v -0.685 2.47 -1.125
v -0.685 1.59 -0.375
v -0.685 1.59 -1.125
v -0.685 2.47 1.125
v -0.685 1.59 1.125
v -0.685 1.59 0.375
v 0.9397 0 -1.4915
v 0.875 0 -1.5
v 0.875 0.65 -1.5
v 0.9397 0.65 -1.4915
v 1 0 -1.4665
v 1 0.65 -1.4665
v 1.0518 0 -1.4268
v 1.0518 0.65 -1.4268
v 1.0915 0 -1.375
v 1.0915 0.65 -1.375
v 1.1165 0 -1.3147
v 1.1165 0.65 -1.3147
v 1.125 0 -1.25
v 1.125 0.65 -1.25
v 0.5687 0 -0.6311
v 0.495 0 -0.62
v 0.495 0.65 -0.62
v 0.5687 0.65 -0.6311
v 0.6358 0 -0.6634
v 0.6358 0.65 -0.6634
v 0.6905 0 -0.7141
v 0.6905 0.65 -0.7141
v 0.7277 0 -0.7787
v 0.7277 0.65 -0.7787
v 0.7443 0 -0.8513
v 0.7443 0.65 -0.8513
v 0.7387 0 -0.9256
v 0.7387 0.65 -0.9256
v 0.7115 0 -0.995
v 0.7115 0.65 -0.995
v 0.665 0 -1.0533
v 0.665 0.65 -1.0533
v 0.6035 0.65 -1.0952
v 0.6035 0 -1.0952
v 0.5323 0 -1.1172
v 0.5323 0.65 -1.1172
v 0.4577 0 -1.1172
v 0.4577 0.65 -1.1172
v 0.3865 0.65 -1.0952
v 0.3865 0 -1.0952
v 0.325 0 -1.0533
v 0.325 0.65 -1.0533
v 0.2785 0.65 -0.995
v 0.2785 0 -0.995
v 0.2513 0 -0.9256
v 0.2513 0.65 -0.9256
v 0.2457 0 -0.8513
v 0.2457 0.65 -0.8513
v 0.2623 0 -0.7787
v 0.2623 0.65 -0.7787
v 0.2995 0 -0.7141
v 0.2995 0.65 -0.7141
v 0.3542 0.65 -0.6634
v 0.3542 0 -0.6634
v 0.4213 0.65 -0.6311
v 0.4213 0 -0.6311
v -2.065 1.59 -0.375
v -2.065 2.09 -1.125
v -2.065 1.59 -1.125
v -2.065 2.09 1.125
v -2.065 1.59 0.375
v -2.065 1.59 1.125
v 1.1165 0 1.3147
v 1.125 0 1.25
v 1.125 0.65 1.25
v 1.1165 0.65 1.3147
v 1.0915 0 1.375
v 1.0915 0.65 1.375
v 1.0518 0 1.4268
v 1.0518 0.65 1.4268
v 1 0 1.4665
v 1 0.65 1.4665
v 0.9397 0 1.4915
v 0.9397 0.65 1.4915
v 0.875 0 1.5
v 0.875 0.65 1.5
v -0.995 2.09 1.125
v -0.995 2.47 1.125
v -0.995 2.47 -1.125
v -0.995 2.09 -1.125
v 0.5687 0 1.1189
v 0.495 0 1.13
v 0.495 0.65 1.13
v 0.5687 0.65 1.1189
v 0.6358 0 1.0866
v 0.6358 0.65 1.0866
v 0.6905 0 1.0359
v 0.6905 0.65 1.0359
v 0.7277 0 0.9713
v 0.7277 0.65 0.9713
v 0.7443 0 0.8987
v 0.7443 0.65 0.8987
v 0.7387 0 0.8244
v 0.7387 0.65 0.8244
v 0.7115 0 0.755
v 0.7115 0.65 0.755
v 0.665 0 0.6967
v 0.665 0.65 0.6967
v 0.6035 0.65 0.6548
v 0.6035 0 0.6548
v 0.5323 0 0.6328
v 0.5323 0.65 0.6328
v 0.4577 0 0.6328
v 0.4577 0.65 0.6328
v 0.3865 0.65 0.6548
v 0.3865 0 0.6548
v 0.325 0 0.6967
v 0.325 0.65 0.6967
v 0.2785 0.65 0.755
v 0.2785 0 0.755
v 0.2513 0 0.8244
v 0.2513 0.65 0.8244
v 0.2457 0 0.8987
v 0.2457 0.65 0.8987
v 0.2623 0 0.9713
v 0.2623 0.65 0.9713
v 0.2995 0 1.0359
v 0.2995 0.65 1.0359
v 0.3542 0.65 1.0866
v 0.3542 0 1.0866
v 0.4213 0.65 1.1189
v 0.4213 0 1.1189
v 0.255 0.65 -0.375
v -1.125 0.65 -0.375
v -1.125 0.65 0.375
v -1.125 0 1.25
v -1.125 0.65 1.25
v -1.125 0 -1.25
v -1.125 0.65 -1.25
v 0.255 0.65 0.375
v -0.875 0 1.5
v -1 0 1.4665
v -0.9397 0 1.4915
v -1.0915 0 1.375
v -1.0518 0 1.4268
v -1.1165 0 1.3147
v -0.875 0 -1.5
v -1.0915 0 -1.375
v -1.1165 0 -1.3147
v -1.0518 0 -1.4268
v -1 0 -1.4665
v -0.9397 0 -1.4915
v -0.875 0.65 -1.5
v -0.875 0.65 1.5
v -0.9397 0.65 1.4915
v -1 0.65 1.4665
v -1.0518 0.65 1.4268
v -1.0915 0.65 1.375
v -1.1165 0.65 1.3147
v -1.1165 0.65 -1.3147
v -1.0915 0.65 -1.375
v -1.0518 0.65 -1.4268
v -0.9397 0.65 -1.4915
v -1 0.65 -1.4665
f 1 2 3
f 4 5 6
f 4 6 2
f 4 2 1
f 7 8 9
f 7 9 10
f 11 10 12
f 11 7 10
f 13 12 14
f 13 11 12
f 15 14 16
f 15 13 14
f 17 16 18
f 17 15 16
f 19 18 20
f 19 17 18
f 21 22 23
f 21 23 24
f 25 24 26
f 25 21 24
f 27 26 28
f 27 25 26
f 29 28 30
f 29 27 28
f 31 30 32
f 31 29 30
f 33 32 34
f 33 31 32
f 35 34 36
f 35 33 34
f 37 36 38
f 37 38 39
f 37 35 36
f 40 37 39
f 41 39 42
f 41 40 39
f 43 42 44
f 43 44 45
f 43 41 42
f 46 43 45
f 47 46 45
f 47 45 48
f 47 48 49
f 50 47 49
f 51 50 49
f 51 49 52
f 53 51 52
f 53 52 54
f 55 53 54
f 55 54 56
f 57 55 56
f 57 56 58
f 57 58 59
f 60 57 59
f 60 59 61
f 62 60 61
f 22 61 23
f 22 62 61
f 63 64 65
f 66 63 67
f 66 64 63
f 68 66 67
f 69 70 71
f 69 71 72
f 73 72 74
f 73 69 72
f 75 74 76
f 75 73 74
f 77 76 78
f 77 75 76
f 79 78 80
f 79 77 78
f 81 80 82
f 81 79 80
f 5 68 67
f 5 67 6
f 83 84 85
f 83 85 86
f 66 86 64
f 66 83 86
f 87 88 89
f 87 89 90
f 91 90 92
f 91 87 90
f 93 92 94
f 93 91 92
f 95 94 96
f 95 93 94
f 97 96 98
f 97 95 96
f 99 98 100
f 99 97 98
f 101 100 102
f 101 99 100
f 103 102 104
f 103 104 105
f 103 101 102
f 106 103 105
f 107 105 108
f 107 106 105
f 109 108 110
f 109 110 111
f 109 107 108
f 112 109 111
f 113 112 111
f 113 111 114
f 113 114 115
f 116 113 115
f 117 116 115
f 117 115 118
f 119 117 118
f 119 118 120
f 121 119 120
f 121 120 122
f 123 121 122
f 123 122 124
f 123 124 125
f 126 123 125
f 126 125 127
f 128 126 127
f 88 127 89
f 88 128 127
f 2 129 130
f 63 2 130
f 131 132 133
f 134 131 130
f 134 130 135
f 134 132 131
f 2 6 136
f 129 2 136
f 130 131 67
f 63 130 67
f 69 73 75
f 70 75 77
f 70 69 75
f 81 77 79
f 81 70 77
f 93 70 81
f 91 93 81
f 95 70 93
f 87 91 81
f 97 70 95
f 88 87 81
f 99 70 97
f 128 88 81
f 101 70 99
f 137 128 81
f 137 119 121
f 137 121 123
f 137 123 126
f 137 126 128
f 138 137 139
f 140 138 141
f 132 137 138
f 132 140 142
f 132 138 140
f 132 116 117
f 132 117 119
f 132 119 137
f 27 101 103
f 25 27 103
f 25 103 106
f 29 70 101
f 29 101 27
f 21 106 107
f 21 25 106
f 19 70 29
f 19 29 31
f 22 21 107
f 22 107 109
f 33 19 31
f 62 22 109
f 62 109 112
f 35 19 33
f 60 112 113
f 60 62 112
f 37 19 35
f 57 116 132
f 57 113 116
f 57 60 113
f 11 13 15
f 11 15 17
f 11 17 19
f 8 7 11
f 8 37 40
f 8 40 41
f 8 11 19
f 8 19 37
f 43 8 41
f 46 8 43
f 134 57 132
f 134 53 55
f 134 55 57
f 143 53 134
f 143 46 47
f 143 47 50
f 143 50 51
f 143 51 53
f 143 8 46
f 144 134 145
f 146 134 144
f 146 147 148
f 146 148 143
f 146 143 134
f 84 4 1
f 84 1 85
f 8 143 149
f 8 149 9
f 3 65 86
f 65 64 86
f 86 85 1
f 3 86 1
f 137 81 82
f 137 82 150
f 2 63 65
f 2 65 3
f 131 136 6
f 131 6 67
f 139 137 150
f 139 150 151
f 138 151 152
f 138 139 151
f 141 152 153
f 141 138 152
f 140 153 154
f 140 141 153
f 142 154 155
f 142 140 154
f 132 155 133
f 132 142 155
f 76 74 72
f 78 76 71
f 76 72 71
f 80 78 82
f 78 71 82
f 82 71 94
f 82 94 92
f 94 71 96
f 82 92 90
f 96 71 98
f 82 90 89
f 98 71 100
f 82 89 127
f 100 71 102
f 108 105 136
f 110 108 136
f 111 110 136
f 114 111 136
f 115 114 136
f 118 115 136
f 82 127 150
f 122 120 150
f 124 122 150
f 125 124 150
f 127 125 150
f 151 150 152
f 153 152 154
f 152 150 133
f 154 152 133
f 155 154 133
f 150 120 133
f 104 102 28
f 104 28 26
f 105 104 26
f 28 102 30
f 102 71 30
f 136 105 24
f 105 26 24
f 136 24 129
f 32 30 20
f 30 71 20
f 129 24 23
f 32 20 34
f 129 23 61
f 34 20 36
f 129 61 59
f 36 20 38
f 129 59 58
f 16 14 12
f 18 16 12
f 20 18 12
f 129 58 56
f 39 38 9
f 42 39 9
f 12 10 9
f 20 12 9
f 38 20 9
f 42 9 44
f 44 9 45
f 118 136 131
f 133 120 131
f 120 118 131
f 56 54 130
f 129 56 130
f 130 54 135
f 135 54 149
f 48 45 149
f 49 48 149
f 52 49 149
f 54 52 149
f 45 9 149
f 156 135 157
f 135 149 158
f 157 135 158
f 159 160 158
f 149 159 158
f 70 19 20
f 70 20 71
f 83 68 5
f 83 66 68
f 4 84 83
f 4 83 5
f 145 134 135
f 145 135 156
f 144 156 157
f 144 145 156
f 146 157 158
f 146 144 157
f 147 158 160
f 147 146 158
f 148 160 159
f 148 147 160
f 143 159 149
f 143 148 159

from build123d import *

# Parameters (mm, degrees)
CROQUIS1_R              = 0.25
SALIENTE_EXTRUIR2_DEPTH = 0.65
SALIENTE_EXTRUIR3_DEPTH = 0.375
SALIENTE_EXTRUIR4_DEPTH = 1.125


with BuildPart() as part:
    # Croquis1 → Saliente-Extruir2 (new body)
    with BuildSketch(Plane(origin=(0, 0, 0), x_dir=(1, 0, 0), z_dir=(0, 1, 0))):
        with BuildLine():
            Line((-0.875, 1.5), (0.875, 1.5))
            ThreePointArc((0.875, 1.5), (1.051776695, 1.426776695), (1.125, 1.25))
            Line((1.125, 1.25), (1.125, -1.25))
            ThreePointArc((1.125, -1.25), (1.051776695, -1.426776695), (0.875, -1.5))
            Line((0.875, -1.5), (-0.875, -1.5))
            ThreePointArc((-0.875, -1.5), (-1.051776695, -1.426776695), (-1.125, -1.25))
            Line((-1.125, -1.25), (-1.125, 1.25))
            ThreePointArc((-1.125, 1.25), (-1.051776695, 1.426776695), (-0.875, 1.5))
        make_face()
        with Locations(Location((0.495, 0.87, 0), (0, 0, 270))):
            Circle(CROQUIS1_R, mode=Mode.SUBTRACT)
        with Locations(Location((0.495, -0.88, 0), (0, 0, 270))):
            Circle(CROQUIS1_R, mode=Mode.SUBTRACT)
    extrude(amount=SALIENTE_EXTRUIR2_DEPTH)

    # Croquis6 → Saliente-Extruir3 (add, symmetric)
    with BuildSketch(Plane.XY):
        Polygon((-1.125, 0.65), (-2.065, 1.59), (-2.065, 2.09), (-0.995, 2.09), (-0.995, 2.47), (-0.685, 2.47), (-0.685, 1.59), (0.255, 0.65), align=None)
    extrude(amount=SALIENTE_EXTRUIR3_DEPTH, both=True)

    # Croquis7 → Saliente-Extruir4 (add, symmetric)
    with BuildSketch(Plane.XY):
        Polygon((-2.065, 1.59), (-0.685, 1.59), (-0.685, 2.47), (-0.995, 2.47), (-0.995, 2.09), (-2.065, 2.09), align=None)
    extrude(amount=SALIENTE_EXTRUIR4_DEPTH, both=True)


solid = part.part
